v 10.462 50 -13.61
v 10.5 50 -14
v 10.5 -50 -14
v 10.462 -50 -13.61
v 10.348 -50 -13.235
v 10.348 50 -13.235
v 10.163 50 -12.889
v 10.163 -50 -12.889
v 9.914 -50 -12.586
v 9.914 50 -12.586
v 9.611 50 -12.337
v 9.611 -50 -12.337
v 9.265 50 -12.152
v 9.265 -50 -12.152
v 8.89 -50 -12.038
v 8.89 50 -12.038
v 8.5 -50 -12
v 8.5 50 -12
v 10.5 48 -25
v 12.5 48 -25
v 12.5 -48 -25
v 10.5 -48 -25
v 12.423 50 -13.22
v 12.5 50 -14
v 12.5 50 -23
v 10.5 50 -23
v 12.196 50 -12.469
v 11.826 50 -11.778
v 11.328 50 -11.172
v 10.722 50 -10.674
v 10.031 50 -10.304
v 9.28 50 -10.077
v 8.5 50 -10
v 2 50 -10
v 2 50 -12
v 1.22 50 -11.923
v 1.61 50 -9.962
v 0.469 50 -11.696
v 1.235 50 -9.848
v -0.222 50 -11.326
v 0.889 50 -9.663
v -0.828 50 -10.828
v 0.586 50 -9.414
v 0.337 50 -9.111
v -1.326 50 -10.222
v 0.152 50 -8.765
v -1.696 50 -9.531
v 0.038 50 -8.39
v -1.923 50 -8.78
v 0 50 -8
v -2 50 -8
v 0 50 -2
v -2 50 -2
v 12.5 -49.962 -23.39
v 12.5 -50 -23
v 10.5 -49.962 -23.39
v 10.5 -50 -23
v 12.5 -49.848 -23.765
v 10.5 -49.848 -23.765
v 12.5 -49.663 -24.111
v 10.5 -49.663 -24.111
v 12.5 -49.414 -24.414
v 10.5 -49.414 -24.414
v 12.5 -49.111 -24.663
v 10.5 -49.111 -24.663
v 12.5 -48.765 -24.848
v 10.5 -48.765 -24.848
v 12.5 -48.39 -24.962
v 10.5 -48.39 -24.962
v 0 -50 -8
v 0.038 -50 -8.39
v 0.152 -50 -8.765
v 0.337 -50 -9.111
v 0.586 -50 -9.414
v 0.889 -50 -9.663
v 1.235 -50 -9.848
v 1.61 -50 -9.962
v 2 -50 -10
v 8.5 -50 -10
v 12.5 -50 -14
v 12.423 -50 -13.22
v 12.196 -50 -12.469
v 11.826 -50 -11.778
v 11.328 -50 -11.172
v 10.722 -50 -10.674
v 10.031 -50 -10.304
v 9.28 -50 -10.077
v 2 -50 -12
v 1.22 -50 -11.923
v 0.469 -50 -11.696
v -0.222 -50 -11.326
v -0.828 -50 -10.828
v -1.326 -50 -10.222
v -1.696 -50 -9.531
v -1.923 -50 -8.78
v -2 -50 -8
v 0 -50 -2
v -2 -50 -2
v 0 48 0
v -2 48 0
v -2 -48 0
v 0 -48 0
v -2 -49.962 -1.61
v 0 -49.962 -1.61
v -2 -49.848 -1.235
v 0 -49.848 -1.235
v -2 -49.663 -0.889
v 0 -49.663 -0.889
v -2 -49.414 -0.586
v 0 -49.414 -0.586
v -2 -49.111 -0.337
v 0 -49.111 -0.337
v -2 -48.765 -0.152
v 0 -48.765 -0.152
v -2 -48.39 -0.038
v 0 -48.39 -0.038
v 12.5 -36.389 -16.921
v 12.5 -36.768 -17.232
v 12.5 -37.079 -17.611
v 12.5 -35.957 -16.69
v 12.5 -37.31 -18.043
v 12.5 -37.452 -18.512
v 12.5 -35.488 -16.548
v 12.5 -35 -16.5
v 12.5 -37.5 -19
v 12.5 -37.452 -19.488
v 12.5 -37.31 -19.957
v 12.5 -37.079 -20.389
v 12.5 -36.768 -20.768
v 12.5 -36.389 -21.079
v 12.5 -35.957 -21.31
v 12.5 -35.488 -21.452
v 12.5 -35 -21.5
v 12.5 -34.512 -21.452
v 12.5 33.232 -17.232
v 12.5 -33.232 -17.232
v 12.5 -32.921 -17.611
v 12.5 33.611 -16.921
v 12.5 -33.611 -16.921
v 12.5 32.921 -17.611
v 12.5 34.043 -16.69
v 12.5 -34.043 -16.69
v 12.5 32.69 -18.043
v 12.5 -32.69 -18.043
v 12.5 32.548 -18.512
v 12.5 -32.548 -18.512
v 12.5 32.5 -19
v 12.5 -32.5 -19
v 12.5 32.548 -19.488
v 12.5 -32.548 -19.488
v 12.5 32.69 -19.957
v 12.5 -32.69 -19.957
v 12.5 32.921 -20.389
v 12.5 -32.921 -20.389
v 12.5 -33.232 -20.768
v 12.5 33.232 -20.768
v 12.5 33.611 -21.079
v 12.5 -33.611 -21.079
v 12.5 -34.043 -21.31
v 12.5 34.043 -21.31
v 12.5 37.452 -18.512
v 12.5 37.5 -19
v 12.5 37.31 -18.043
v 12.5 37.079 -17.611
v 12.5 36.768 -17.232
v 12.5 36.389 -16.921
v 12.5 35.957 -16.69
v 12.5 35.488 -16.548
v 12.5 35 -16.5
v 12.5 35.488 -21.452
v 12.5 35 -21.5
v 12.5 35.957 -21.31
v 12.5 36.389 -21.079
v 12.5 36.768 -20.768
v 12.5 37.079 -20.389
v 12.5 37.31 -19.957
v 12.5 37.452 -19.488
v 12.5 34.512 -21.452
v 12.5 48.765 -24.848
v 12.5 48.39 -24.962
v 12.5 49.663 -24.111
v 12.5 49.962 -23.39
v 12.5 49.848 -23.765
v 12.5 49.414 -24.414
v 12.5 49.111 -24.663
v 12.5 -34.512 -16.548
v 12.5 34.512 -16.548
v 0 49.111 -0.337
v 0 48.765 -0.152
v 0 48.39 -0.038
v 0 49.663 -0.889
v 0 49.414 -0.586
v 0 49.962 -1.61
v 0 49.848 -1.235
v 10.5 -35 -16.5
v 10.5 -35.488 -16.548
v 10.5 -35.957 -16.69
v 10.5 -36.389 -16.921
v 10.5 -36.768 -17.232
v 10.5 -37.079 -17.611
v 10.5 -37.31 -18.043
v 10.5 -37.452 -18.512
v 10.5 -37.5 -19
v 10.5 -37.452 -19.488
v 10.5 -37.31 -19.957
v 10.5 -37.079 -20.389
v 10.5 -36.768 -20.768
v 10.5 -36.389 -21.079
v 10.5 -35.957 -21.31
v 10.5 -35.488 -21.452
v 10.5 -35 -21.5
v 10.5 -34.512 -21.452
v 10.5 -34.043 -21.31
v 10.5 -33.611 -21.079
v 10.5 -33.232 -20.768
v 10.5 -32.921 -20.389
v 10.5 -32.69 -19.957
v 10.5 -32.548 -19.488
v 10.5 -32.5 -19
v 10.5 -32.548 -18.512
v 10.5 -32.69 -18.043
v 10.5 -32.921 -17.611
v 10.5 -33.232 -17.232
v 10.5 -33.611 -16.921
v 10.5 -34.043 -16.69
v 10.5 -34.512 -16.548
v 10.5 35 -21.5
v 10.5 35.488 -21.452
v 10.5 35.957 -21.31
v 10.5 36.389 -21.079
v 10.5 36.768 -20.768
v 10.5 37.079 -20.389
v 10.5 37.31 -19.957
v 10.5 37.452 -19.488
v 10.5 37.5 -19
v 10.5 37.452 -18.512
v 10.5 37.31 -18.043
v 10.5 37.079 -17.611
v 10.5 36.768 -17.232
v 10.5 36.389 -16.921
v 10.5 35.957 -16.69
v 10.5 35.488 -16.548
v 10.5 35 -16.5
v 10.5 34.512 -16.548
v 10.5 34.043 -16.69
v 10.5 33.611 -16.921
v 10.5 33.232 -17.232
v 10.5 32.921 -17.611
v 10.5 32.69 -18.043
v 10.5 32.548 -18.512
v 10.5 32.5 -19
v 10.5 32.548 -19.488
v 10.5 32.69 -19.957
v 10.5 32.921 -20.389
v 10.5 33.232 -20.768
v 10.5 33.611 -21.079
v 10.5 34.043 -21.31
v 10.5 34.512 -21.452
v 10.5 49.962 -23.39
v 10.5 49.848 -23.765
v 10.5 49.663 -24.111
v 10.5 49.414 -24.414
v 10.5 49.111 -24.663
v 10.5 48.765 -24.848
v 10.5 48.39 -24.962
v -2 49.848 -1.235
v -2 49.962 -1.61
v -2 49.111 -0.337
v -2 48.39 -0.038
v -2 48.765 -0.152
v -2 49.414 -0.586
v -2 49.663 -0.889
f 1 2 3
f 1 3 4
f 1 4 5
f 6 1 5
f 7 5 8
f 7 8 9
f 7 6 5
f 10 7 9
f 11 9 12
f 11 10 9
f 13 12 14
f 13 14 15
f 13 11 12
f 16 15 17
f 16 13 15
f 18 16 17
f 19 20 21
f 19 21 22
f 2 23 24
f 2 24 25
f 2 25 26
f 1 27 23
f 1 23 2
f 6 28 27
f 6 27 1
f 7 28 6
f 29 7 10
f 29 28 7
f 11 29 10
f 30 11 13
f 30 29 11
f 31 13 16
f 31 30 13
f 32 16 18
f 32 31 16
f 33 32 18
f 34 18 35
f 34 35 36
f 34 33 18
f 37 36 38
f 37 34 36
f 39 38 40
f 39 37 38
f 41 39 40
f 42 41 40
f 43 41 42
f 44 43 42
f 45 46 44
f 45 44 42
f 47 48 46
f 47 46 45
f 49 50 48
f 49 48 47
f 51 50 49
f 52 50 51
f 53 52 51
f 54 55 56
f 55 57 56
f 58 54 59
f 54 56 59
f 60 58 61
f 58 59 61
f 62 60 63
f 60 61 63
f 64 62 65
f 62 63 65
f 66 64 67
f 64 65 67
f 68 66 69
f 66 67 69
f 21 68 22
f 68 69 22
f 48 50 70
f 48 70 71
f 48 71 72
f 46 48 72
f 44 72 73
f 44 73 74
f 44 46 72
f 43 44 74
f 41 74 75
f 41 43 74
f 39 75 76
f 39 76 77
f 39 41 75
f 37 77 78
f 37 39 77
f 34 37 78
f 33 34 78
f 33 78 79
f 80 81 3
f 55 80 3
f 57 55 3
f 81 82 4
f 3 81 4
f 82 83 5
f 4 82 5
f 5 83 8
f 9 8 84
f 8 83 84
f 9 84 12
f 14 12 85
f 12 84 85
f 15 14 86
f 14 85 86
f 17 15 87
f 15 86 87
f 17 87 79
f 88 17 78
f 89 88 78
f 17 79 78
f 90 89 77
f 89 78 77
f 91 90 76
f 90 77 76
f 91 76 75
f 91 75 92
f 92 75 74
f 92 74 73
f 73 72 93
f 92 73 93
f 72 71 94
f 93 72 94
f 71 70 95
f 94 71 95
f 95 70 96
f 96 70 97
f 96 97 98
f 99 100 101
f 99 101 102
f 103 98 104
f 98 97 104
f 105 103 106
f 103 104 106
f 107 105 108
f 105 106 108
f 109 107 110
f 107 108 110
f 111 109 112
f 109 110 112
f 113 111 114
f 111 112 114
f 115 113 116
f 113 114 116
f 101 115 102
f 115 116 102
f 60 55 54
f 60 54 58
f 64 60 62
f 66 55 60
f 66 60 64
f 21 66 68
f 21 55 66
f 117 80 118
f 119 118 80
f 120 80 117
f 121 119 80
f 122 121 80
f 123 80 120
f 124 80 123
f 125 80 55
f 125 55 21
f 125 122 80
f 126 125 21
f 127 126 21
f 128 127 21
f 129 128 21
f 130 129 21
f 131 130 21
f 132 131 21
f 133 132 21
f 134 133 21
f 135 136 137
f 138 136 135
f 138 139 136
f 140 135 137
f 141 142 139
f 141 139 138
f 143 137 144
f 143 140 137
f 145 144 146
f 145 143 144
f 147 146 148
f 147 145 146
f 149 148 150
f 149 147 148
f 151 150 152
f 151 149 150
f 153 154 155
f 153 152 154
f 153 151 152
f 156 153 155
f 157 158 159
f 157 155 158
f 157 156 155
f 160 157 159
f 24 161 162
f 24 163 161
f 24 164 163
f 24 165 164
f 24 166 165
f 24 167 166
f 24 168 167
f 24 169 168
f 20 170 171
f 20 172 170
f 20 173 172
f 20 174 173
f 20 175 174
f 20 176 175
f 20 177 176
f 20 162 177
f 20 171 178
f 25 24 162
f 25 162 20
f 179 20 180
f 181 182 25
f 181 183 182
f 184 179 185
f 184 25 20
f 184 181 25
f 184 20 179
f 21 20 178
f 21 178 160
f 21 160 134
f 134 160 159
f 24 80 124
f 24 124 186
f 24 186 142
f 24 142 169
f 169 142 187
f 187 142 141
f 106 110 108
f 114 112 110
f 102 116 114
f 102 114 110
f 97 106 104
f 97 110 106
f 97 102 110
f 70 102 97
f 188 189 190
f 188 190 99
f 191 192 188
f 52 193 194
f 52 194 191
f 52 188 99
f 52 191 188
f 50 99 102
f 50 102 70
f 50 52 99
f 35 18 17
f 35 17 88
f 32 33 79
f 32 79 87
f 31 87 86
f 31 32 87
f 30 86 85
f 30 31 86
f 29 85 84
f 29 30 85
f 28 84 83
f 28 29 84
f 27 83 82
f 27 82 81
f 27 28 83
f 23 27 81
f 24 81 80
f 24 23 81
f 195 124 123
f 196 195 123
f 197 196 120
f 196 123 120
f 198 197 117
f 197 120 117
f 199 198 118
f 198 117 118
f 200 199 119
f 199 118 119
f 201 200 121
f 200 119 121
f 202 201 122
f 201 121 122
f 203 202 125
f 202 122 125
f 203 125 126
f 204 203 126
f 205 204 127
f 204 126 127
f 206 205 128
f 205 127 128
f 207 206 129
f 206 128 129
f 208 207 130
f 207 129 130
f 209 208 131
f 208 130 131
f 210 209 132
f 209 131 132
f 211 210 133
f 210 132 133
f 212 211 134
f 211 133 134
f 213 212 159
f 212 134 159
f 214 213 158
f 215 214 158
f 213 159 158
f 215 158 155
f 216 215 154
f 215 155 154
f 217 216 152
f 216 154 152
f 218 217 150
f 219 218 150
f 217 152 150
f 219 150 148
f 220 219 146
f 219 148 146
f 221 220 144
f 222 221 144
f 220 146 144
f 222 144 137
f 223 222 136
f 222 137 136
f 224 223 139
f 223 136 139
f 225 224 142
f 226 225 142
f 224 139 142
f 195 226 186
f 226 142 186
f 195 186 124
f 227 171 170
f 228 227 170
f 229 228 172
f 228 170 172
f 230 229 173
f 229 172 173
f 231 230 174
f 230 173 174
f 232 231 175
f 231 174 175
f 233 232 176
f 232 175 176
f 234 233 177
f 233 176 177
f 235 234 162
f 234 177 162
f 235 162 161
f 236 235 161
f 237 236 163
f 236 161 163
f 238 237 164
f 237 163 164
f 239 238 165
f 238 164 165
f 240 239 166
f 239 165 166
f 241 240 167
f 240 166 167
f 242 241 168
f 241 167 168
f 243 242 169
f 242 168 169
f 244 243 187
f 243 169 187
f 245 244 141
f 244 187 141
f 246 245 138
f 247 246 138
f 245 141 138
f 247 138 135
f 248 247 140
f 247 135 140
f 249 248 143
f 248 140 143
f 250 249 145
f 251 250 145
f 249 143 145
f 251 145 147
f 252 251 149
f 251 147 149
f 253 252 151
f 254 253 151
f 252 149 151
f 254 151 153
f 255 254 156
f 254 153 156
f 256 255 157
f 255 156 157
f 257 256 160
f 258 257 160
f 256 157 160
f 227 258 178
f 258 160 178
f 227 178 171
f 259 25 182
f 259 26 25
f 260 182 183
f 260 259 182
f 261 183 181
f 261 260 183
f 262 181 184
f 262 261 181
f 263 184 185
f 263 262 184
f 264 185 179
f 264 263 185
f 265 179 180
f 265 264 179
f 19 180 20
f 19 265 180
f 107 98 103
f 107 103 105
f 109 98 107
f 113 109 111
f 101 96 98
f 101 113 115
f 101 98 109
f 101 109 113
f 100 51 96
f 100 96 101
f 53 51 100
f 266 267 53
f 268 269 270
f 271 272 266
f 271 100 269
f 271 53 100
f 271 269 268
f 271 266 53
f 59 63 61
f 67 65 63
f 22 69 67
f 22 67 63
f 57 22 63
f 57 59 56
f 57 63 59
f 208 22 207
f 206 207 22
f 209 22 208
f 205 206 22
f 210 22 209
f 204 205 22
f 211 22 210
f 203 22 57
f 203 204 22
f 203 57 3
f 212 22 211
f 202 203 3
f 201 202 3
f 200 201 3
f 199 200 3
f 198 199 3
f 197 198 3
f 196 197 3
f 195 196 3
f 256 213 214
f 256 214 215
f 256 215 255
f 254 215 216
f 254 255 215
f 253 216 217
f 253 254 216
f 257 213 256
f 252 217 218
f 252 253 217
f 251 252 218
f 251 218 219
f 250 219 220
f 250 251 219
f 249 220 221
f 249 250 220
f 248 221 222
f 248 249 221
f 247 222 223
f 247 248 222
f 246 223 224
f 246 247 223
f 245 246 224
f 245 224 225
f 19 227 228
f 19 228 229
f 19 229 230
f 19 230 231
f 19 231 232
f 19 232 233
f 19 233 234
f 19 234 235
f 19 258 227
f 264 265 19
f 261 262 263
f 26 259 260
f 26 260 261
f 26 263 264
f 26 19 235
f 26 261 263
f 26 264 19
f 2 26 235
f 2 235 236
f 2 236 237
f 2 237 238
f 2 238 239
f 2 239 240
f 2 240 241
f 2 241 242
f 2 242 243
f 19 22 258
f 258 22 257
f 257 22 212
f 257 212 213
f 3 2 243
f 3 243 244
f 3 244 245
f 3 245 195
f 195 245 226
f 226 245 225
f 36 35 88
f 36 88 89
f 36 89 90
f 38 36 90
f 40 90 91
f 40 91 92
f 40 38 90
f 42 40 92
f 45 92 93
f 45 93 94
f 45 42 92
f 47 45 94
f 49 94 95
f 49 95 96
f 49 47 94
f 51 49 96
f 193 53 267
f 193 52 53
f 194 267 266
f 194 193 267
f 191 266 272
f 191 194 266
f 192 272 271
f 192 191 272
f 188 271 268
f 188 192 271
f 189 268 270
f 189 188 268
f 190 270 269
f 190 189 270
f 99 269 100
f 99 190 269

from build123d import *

# Parameters (mm, degrees)
BASE_FLANGE1_DEPTH = 50
SKETCH3_R          = 2.5
EXTRUDE1_DEPTH     = 2
FILLET1_R          = 2


# Sheet-metal steps are written as plain solids
with BuildPart() as part:
    # Sketch1 → Base-Flange1 (new, symmetric)
    with BuildSketch(Plane(origin=(0, 0, 0), x_dir=(-1, 0, 0), z_dir=(0, 1, 0))):
        with BuildLine():
            Line((0, 0), (0, -8))
            ThreePointArc((0, -8), (-0.585786438, -9.414213562), (-2, -10))
            Line((-2, -10), (-8.5, -10))
            ThreePointArc((-8.5, -10), (-11.328427125, -11.171572875), (-12.5, -14))
            Line((-12.5, -14), (-12.5, -25))
            Line((-12.5, -25), (-10.5, -25))
            Line((-10.5, -25), (-10.5, -14))
            ThreePointArc((-10.5, -14), (-9.914213562, -12.585786438), (-8.5, -12))
            Line((-8.5, -12), (-2, -12))
            ThreePointArc((-2, -12), (0.828427125, -10.828427125), (2, -8))
            Line((2, -8), (2, 0))
            Line((2, 0), (0, 0))
        make_face()
    extrude(amount=BASE_FLANGE1_DEPTH, both=True)

    # Sketch3 → Extrude1 (cut)
    with BuildSketch(Plane(origin=(12.5, 0, 0), x_dir=(0, 0, 1), z_dir=(1, 0, 0))):
        with Locations((-19, 35)):
            Circle(SKETCH3_R)
        with Locations(Location((-19, -35, 0), (0, 0, 180))):
            Circle(SKETCH3_R)
    extrude(amount=-EXTRUDE1_DEPTH, mode=Mode.SUBTRACT)

    # Fillet1
    fillet1_edges = [part.edges().sort_by_distance(p)[0] for p in [
        (-1, -50, 0),
        (11.5, -50, -25),
        (-1, 50, 0),
        (11.5, 50, -25),
    ]]
    fillet(fillet1_edges, radius=FILLET1_R)


solid = part.part
